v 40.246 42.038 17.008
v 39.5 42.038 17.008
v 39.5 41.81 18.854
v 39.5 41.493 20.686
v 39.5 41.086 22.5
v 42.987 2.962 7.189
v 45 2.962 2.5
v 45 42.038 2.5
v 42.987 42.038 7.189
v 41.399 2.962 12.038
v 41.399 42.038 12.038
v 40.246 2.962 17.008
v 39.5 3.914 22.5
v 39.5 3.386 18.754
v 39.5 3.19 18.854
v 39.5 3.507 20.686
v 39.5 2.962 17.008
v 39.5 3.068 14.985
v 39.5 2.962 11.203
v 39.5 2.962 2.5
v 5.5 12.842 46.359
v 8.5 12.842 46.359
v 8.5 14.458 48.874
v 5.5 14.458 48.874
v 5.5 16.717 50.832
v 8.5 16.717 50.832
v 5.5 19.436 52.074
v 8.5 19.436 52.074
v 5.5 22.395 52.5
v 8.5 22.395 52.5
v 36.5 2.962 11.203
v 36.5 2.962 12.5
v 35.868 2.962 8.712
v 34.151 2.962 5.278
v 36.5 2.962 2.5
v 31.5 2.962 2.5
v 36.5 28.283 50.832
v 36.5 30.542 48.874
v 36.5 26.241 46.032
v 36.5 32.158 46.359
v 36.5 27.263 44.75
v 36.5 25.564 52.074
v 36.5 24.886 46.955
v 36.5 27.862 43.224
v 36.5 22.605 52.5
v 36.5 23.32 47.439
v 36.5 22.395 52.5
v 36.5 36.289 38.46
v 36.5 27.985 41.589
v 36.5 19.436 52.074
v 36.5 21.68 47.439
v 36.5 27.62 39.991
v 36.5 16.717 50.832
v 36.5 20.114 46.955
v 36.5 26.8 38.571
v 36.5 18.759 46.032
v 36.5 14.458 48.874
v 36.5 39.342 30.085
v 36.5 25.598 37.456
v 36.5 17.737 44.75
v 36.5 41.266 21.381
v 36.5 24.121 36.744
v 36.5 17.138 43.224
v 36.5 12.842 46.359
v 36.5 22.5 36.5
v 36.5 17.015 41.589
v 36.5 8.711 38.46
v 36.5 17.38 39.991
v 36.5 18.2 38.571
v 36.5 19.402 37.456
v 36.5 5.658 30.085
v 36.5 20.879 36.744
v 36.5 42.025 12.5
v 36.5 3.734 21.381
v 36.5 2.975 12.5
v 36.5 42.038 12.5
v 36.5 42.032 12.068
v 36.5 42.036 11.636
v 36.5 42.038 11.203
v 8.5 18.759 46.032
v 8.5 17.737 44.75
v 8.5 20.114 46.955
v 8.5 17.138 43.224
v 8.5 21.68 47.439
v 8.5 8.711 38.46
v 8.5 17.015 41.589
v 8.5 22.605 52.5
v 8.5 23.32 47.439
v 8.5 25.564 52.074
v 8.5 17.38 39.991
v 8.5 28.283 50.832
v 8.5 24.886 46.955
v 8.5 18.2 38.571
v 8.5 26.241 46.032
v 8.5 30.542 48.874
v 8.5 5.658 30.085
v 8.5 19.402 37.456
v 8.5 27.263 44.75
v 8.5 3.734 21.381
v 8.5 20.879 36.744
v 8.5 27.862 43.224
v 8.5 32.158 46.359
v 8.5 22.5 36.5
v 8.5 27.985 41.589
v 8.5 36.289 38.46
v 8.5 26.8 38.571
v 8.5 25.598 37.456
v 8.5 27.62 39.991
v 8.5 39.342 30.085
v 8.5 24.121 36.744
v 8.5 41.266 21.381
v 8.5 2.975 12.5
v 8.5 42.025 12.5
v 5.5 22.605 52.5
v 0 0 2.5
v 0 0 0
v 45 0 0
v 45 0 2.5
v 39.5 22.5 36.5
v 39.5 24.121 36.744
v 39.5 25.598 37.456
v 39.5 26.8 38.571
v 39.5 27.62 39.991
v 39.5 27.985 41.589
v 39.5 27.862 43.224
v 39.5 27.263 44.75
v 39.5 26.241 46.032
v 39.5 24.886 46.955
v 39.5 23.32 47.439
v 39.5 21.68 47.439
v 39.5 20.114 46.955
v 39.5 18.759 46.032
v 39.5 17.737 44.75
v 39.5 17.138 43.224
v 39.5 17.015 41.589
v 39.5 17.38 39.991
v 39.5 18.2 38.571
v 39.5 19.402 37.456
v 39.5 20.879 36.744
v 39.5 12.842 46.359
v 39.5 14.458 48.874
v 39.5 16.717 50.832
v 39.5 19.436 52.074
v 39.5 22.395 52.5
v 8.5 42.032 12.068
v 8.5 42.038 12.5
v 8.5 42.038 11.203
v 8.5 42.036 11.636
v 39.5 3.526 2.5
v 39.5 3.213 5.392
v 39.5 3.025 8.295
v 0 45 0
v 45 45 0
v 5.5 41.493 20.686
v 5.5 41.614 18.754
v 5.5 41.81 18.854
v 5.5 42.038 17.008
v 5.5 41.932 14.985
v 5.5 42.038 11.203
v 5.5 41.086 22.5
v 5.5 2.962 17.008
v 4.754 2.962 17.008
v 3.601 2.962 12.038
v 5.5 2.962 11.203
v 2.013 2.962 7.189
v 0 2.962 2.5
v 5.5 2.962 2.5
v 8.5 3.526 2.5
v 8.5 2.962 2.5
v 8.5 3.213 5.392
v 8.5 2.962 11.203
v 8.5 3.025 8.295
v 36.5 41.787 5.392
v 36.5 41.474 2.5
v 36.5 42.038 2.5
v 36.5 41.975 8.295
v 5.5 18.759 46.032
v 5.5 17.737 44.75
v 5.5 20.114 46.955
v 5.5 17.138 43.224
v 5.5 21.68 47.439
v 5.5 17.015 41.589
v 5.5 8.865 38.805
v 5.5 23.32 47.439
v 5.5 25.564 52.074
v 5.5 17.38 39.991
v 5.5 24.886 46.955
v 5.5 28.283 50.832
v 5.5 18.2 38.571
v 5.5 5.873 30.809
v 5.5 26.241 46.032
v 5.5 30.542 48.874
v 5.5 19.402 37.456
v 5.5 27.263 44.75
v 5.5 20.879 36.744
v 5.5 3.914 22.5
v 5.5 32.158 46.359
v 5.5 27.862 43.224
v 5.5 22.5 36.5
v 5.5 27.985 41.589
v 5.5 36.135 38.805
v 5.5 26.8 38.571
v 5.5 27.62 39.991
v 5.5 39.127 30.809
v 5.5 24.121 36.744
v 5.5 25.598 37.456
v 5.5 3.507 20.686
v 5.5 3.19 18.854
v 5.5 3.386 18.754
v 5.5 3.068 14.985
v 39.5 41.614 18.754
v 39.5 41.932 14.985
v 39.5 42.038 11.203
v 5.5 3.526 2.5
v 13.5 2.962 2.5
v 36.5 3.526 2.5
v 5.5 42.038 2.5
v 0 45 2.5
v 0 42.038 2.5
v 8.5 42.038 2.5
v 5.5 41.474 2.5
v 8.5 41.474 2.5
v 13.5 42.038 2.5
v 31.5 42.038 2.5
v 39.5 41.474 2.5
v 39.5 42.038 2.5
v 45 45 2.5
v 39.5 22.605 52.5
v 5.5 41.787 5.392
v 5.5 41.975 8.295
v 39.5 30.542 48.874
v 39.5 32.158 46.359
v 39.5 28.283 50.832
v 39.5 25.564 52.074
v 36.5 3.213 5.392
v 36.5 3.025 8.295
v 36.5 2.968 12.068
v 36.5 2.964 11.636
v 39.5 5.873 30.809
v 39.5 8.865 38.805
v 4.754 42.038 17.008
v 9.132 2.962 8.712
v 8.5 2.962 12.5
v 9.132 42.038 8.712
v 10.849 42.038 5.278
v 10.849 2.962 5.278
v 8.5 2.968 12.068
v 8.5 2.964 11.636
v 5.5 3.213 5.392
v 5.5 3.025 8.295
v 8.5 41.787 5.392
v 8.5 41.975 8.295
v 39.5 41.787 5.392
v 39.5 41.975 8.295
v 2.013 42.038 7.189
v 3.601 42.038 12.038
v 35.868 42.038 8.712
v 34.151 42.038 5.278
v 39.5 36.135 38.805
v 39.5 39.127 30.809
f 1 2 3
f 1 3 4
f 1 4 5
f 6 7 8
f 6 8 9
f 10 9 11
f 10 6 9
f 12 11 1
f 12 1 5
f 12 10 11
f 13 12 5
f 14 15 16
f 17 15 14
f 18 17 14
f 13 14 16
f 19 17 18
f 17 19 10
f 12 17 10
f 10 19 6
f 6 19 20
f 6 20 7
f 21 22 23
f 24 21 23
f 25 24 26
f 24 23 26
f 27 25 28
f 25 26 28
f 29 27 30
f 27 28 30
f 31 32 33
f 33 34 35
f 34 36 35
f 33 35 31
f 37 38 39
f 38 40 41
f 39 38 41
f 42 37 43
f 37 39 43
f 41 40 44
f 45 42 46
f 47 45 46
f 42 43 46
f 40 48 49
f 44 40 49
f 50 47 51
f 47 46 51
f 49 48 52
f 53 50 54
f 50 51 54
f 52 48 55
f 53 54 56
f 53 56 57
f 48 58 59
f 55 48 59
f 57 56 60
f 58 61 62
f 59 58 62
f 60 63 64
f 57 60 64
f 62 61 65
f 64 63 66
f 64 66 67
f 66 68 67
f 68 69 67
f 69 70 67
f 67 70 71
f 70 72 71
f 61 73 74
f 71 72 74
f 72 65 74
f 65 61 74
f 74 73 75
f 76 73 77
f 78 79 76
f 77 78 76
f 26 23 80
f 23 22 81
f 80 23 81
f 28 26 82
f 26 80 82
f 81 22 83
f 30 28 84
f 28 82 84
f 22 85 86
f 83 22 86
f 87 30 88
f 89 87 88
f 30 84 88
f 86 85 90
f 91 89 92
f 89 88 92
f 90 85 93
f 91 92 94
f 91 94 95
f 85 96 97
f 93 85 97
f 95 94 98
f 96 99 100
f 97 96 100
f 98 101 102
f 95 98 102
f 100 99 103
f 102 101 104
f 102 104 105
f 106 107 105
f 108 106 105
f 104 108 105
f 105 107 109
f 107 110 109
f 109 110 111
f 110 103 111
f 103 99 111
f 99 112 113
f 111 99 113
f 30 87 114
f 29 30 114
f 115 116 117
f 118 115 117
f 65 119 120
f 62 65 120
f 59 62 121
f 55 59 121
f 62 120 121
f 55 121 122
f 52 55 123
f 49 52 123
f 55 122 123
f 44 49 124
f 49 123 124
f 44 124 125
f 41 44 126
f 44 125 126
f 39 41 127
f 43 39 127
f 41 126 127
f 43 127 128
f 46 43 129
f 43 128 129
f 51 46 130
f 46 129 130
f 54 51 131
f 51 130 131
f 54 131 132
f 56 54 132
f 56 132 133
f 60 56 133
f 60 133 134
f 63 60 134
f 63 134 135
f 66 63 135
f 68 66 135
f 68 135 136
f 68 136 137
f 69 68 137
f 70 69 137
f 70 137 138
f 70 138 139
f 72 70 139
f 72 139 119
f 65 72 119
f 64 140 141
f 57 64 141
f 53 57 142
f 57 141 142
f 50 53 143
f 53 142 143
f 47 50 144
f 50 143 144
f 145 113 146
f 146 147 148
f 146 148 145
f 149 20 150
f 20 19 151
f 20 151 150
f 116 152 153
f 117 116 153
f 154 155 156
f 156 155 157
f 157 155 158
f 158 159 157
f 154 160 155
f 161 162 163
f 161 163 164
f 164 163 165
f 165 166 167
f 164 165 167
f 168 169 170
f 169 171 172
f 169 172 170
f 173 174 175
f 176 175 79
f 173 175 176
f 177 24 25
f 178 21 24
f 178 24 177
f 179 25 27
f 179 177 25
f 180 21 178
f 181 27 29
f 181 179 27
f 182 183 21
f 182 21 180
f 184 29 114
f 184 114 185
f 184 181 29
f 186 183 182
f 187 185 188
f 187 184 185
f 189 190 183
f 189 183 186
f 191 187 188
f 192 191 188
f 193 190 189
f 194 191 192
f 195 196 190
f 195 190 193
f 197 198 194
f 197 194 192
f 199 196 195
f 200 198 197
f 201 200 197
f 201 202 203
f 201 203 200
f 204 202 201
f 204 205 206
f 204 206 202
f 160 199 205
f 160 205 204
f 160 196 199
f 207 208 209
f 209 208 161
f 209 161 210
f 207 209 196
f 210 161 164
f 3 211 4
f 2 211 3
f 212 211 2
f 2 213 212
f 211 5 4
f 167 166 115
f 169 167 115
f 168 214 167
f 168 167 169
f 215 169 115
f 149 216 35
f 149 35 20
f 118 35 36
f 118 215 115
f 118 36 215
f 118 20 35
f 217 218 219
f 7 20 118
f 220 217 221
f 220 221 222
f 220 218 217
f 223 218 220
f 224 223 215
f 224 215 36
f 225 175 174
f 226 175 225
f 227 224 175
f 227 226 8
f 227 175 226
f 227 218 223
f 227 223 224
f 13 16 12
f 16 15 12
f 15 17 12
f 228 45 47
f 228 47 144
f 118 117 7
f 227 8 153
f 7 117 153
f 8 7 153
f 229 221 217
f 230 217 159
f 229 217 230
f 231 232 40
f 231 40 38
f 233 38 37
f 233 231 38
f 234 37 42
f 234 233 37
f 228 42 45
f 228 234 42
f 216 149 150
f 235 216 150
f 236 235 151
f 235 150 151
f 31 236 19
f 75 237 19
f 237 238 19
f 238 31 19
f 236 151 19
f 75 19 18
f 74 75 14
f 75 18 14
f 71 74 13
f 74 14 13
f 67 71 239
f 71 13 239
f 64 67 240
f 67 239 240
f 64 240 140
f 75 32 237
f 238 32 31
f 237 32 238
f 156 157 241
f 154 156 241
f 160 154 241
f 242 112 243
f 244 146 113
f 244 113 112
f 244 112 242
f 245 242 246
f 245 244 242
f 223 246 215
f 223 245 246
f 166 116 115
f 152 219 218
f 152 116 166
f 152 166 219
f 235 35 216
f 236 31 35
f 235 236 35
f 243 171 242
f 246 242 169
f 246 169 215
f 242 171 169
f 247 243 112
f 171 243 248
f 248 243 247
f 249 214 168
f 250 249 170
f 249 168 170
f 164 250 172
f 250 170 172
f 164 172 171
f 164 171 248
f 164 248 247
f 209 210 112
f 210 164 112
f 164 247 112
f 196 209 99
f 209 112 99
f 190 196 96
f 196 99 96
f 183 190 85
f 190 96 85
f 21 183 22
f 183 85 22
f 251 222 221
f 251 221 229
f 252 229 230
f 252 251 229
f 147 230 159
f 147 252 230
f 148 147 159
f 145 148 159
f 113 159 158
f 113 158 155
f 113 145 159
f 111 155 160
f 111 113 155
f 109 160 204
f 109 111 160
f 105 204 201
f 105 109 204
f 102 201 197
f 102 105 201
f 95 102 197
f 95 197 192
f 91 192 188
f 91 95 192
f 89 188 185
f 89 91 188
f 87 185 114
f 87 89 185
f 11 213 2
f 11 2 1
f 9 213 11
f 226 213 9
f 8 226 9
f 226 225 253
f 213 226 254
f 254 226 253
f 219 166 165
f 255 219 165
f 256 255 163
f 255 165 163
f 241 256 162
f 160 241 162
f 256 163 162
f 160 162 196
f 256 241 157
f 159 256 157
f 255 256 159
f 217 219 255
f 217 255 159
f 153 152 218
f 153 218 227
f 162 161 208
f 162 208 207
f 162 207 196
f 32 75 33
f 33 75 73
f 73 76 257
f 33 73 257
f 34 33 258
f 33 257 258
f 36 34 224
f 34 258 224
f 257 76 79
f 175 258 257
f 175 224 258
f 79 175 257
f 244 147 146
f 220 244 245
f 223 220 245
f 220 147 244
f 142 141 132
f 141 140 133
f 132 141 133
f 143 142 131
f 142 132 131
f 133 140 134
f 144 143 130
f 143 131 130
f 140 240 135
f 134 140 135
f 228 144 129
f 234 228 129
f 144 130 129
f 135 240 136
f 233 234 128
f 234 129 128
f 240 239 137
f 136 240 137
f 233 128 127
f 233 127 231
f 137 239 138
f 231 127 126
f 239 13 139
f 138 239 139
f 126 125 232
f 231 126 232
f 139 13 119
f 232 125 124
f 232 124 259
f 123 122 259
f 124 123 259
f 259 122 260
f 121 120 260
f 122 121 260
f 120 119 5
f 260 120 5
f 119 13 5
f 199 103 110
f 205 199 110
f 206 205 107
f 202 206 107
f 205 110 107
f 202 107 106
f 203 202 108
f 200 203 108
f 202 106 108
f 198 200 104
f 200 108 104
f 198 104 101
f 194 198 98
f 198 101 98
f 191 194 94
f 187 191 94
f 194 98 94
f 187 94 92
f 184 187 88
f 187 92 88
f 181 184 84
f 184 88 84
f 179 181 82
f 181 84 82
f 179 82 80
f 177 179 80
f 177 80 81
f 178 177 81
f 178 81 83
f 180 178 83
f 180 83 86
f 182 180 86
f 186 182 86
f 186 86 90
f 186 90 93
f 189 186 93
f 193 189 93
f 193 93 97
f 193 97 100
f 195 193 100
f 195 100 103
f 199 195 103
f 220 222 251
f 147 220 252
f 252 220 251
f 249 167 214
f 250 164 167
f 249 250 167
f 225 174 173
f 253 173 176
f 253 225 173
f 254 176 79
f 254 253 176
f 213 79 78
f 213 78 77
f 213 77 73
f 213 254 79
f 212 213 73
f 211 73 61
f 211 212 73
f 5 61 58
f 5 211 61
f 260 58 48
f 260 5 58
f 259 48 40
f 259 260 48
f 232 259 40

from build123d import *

# Parameters (mm, degrees)
SKETCH_1_W          = 45
SKETCH_1_H          = 45
EXTRUDE_1_DEPTH     = 2.5
EXTRUDE_2_DEPTH     = 50
SKETCH_3_R          = 5.5
CUT_EXTRUDE_1_DEPTH = 40.5
CUT_EXTRUDE_2_DEPTH = 40.5
SKETCH_5_W          = 5
SKETCH_5_H          = 39.075696326
EXTRUDE_3_DEPTH     = 10
CUT_EXTRUDE_3_DEPTH = 43.037848163
SKETCH_7_W          = 5.5
SKETCH_7_H          = 39.075696326
EXTRUDE_4_DEPTH     = 20
CUT_EXTRUDE_4_DEPTH = 46
CUT_EXTRUDE_5_DEPTH = 43.037848163


with BuildPart() as part:
    # 草图1 → 凸台-拉伸1 (new body)
    with BuildSketch(Plane.XY):
        with Locations((22.5, 22.5)):
            Rectangle(SKETCH_1_W, SKETCH_1_H)
    extrude(amount=EXTRUDE_1_DEPTH)

    # 草图2 → 凸台-拉伸2 (add)
    with BuildSketch(Plane.XY.offset(2.5)):
        Polygon((36.5, 22.5), (36.5, 0), (39.5, 0), (39.5, 45), (36.5, 45), align=None)
        Polygon((8.5, 45), (8.5, 22.5), (8.5, 0), (5.5, 0), (5.5, 45), align=None)
    extrude(amount=EXTRUDE_2_DEPTH)

    # 草图3 → 切除-拉伸1 (cut, through all)
    with BuildSketch(Plane(origin=(39.5, 0, 0), x_dir=(0, 0, -1), z_dir=(1, 0, 0))):
        with Locations((-42, 22.5)):
            Circle(SKETCH_3_R)
    extrude(amount=-CUT_EXTRUDE_1_DEPTH, mode=Mode.SUBTRACT)

    # 草图4 → 切除-拉伸2 (cut, through all)
    with BuildSketch(Plane(origin=(39.5, 0, 0), x_dir=(0, 0, -1), z_dir=(1, 0, 0))):
        with BuildLine():
            Line((-2.5, 45), (-2.5, 41.474247654))
            ThreePointArc((-2.5, 41.474247654), (-25.225749209, 40.564939101), (-46.358725725, 32.157571933))
            ThreePointArc((-46.358725725, 32.157571933), (-50.832231318, 28.283182945), (-52.5, 22.605006306))
            Line((-52.5, 22.605006306), (-52.5, 45))
            Line((-52.5, 45), (-2.5, 45))
        make_face()
        with BuildLine():
            Line((-52.5, 22.394993694), (-52.5, 0))
            Line((-52.5, 0), (-2.5, 0))
            Line((-2.5, 0), (-2.5, 3.525752346))
            ThreePointArc((-2.5, 3.525752346), (-25.225749209, 4.435060899), (-46.358725725, 12.842428067))
            ThreePointArc((-46.358725725, 12.842428067), (-50.832231318, 16.716817055), (-52.5, 22.394993694))
        make_face()
    extrude(amount=-CUT_EXTRUDE_2_DEPTH, mode=Mode.SUBTRACT)

    # 草图5 → 凸台-拉伸3 (add)
    with BuildSketch(Plane.XY.offset(2.5)):
        with Locations((11, 22.5)):
            Rectangle(SKETCH_5_W, SKETCH_5_H)
        with Locations((34, 22.5)):
            Rectangle(SKETCH_5_W, SKETCH_5_H)
    extrude(amount=EXTRUDE_3_DEPTH)

    # 草图6 → 切除-拉伸3 (cut, through all)
    with BuildSketch(Plane(origin=(0, 42.037848163, 0), x_dir=(1, 0, 0), z_dir=(0, 1, 0))):
        with BuildLine():
            Line((13.5, -2.5), (13.5, -12.5))
            Line((13.5, -12.5), (8.5, -12.5))
            ThreePointArc((8.5, -12.5), (9.861833326, -6.930916663), (13.5, -2.5))
        make_face()
        with BuildLine():
            Line((31.5, -2.5), (31.5, -12.5))
            Line((31.5, -12.5), (36.5, -12.5))
            ThreePointArc((36.5, -12.5), (35.138166674, -6.930916663), (31.5, -2.5))
        make_face()
    extrude(amount=-CUT_EXTRUDE_3_DEPTH, mode=Mode.SUBTRACT)

    # 草图7 → 凸台-拉伸4 (add)
    with BuildSketch(Plane.XY.offset(2.5)):
        with Locations((2.75, 22.5)):
            Rectangle(SKETCH_7_W, SKETCH_7_H)
        with Locations((42.25, 22.5)):
            Rectangle(SKETCH_7_W, SKETCH_7_H)
    extrude(amount=EXTRUDE_4_DEPTH)

    # 草图8 → 切除-拉伸4 (cut, through all)
    with BuildSketch(Plane(origin=(45, 0, 0), x_dir=(0, 0, -1), z_dir=(1, 0, 0))):
        with BuildLine():
            Line((-22.5, 41.085625399), (-22.5, 42.037848163))
            Line((-22.5, 42.037848163), (-17.008220021, 42.037848163))
            ThreePointArc((-17.008220021, 42.037848163), (-19.771631621, 41.662789638), (-22.5, 41.085625399))
        make_face()
        with BuildLine():
            Line((-22.5, 3.914374601), (-22.5, 2.962151837))
            Line((-22.5, 2.962151837), (-17.008220021, 2.962151837))
            ThreePointArc((-17.008220021, 2.962151837), (-19.771631621, 3.337210362), (-22.5, 3.914374601))
        make_face()
    extrude(amount=-CUT_EXTRUDE_4_DEPTH, mode=Mode.SUBTRACT)

    # 草图9 → 切除-拉伸5 (cut, through all)
    with BuildSketch(Plane(origin=(0, 2.962151837, 0), x_dir=(-1, 0, 0), z_dir=(0, -1, 0))):
        with BuildLine():
            Line((-39.5, -22.5), (-45, -22.5))
            Line((-45, -22.5), (-45, -2.5))
            ThreePointArc((-45, -2.5), (-41.339785895, -12.249691121), (-39.5, -22.5))
        make_face()
        with BuildLine():
            Line((-5.5, -22.5), (0, -22.5))
            Line((0, -22.5), (0, -2.5))
            ThreePointArc((0, -2.5), (-3.660214105, -12.249691121), (-5.5, -22.5))
        make_face()
    extrude(amount=-CUT_EXTRUDE_5_DEPTH, mode=Mode.SUBTRACT)


solid = part.part
